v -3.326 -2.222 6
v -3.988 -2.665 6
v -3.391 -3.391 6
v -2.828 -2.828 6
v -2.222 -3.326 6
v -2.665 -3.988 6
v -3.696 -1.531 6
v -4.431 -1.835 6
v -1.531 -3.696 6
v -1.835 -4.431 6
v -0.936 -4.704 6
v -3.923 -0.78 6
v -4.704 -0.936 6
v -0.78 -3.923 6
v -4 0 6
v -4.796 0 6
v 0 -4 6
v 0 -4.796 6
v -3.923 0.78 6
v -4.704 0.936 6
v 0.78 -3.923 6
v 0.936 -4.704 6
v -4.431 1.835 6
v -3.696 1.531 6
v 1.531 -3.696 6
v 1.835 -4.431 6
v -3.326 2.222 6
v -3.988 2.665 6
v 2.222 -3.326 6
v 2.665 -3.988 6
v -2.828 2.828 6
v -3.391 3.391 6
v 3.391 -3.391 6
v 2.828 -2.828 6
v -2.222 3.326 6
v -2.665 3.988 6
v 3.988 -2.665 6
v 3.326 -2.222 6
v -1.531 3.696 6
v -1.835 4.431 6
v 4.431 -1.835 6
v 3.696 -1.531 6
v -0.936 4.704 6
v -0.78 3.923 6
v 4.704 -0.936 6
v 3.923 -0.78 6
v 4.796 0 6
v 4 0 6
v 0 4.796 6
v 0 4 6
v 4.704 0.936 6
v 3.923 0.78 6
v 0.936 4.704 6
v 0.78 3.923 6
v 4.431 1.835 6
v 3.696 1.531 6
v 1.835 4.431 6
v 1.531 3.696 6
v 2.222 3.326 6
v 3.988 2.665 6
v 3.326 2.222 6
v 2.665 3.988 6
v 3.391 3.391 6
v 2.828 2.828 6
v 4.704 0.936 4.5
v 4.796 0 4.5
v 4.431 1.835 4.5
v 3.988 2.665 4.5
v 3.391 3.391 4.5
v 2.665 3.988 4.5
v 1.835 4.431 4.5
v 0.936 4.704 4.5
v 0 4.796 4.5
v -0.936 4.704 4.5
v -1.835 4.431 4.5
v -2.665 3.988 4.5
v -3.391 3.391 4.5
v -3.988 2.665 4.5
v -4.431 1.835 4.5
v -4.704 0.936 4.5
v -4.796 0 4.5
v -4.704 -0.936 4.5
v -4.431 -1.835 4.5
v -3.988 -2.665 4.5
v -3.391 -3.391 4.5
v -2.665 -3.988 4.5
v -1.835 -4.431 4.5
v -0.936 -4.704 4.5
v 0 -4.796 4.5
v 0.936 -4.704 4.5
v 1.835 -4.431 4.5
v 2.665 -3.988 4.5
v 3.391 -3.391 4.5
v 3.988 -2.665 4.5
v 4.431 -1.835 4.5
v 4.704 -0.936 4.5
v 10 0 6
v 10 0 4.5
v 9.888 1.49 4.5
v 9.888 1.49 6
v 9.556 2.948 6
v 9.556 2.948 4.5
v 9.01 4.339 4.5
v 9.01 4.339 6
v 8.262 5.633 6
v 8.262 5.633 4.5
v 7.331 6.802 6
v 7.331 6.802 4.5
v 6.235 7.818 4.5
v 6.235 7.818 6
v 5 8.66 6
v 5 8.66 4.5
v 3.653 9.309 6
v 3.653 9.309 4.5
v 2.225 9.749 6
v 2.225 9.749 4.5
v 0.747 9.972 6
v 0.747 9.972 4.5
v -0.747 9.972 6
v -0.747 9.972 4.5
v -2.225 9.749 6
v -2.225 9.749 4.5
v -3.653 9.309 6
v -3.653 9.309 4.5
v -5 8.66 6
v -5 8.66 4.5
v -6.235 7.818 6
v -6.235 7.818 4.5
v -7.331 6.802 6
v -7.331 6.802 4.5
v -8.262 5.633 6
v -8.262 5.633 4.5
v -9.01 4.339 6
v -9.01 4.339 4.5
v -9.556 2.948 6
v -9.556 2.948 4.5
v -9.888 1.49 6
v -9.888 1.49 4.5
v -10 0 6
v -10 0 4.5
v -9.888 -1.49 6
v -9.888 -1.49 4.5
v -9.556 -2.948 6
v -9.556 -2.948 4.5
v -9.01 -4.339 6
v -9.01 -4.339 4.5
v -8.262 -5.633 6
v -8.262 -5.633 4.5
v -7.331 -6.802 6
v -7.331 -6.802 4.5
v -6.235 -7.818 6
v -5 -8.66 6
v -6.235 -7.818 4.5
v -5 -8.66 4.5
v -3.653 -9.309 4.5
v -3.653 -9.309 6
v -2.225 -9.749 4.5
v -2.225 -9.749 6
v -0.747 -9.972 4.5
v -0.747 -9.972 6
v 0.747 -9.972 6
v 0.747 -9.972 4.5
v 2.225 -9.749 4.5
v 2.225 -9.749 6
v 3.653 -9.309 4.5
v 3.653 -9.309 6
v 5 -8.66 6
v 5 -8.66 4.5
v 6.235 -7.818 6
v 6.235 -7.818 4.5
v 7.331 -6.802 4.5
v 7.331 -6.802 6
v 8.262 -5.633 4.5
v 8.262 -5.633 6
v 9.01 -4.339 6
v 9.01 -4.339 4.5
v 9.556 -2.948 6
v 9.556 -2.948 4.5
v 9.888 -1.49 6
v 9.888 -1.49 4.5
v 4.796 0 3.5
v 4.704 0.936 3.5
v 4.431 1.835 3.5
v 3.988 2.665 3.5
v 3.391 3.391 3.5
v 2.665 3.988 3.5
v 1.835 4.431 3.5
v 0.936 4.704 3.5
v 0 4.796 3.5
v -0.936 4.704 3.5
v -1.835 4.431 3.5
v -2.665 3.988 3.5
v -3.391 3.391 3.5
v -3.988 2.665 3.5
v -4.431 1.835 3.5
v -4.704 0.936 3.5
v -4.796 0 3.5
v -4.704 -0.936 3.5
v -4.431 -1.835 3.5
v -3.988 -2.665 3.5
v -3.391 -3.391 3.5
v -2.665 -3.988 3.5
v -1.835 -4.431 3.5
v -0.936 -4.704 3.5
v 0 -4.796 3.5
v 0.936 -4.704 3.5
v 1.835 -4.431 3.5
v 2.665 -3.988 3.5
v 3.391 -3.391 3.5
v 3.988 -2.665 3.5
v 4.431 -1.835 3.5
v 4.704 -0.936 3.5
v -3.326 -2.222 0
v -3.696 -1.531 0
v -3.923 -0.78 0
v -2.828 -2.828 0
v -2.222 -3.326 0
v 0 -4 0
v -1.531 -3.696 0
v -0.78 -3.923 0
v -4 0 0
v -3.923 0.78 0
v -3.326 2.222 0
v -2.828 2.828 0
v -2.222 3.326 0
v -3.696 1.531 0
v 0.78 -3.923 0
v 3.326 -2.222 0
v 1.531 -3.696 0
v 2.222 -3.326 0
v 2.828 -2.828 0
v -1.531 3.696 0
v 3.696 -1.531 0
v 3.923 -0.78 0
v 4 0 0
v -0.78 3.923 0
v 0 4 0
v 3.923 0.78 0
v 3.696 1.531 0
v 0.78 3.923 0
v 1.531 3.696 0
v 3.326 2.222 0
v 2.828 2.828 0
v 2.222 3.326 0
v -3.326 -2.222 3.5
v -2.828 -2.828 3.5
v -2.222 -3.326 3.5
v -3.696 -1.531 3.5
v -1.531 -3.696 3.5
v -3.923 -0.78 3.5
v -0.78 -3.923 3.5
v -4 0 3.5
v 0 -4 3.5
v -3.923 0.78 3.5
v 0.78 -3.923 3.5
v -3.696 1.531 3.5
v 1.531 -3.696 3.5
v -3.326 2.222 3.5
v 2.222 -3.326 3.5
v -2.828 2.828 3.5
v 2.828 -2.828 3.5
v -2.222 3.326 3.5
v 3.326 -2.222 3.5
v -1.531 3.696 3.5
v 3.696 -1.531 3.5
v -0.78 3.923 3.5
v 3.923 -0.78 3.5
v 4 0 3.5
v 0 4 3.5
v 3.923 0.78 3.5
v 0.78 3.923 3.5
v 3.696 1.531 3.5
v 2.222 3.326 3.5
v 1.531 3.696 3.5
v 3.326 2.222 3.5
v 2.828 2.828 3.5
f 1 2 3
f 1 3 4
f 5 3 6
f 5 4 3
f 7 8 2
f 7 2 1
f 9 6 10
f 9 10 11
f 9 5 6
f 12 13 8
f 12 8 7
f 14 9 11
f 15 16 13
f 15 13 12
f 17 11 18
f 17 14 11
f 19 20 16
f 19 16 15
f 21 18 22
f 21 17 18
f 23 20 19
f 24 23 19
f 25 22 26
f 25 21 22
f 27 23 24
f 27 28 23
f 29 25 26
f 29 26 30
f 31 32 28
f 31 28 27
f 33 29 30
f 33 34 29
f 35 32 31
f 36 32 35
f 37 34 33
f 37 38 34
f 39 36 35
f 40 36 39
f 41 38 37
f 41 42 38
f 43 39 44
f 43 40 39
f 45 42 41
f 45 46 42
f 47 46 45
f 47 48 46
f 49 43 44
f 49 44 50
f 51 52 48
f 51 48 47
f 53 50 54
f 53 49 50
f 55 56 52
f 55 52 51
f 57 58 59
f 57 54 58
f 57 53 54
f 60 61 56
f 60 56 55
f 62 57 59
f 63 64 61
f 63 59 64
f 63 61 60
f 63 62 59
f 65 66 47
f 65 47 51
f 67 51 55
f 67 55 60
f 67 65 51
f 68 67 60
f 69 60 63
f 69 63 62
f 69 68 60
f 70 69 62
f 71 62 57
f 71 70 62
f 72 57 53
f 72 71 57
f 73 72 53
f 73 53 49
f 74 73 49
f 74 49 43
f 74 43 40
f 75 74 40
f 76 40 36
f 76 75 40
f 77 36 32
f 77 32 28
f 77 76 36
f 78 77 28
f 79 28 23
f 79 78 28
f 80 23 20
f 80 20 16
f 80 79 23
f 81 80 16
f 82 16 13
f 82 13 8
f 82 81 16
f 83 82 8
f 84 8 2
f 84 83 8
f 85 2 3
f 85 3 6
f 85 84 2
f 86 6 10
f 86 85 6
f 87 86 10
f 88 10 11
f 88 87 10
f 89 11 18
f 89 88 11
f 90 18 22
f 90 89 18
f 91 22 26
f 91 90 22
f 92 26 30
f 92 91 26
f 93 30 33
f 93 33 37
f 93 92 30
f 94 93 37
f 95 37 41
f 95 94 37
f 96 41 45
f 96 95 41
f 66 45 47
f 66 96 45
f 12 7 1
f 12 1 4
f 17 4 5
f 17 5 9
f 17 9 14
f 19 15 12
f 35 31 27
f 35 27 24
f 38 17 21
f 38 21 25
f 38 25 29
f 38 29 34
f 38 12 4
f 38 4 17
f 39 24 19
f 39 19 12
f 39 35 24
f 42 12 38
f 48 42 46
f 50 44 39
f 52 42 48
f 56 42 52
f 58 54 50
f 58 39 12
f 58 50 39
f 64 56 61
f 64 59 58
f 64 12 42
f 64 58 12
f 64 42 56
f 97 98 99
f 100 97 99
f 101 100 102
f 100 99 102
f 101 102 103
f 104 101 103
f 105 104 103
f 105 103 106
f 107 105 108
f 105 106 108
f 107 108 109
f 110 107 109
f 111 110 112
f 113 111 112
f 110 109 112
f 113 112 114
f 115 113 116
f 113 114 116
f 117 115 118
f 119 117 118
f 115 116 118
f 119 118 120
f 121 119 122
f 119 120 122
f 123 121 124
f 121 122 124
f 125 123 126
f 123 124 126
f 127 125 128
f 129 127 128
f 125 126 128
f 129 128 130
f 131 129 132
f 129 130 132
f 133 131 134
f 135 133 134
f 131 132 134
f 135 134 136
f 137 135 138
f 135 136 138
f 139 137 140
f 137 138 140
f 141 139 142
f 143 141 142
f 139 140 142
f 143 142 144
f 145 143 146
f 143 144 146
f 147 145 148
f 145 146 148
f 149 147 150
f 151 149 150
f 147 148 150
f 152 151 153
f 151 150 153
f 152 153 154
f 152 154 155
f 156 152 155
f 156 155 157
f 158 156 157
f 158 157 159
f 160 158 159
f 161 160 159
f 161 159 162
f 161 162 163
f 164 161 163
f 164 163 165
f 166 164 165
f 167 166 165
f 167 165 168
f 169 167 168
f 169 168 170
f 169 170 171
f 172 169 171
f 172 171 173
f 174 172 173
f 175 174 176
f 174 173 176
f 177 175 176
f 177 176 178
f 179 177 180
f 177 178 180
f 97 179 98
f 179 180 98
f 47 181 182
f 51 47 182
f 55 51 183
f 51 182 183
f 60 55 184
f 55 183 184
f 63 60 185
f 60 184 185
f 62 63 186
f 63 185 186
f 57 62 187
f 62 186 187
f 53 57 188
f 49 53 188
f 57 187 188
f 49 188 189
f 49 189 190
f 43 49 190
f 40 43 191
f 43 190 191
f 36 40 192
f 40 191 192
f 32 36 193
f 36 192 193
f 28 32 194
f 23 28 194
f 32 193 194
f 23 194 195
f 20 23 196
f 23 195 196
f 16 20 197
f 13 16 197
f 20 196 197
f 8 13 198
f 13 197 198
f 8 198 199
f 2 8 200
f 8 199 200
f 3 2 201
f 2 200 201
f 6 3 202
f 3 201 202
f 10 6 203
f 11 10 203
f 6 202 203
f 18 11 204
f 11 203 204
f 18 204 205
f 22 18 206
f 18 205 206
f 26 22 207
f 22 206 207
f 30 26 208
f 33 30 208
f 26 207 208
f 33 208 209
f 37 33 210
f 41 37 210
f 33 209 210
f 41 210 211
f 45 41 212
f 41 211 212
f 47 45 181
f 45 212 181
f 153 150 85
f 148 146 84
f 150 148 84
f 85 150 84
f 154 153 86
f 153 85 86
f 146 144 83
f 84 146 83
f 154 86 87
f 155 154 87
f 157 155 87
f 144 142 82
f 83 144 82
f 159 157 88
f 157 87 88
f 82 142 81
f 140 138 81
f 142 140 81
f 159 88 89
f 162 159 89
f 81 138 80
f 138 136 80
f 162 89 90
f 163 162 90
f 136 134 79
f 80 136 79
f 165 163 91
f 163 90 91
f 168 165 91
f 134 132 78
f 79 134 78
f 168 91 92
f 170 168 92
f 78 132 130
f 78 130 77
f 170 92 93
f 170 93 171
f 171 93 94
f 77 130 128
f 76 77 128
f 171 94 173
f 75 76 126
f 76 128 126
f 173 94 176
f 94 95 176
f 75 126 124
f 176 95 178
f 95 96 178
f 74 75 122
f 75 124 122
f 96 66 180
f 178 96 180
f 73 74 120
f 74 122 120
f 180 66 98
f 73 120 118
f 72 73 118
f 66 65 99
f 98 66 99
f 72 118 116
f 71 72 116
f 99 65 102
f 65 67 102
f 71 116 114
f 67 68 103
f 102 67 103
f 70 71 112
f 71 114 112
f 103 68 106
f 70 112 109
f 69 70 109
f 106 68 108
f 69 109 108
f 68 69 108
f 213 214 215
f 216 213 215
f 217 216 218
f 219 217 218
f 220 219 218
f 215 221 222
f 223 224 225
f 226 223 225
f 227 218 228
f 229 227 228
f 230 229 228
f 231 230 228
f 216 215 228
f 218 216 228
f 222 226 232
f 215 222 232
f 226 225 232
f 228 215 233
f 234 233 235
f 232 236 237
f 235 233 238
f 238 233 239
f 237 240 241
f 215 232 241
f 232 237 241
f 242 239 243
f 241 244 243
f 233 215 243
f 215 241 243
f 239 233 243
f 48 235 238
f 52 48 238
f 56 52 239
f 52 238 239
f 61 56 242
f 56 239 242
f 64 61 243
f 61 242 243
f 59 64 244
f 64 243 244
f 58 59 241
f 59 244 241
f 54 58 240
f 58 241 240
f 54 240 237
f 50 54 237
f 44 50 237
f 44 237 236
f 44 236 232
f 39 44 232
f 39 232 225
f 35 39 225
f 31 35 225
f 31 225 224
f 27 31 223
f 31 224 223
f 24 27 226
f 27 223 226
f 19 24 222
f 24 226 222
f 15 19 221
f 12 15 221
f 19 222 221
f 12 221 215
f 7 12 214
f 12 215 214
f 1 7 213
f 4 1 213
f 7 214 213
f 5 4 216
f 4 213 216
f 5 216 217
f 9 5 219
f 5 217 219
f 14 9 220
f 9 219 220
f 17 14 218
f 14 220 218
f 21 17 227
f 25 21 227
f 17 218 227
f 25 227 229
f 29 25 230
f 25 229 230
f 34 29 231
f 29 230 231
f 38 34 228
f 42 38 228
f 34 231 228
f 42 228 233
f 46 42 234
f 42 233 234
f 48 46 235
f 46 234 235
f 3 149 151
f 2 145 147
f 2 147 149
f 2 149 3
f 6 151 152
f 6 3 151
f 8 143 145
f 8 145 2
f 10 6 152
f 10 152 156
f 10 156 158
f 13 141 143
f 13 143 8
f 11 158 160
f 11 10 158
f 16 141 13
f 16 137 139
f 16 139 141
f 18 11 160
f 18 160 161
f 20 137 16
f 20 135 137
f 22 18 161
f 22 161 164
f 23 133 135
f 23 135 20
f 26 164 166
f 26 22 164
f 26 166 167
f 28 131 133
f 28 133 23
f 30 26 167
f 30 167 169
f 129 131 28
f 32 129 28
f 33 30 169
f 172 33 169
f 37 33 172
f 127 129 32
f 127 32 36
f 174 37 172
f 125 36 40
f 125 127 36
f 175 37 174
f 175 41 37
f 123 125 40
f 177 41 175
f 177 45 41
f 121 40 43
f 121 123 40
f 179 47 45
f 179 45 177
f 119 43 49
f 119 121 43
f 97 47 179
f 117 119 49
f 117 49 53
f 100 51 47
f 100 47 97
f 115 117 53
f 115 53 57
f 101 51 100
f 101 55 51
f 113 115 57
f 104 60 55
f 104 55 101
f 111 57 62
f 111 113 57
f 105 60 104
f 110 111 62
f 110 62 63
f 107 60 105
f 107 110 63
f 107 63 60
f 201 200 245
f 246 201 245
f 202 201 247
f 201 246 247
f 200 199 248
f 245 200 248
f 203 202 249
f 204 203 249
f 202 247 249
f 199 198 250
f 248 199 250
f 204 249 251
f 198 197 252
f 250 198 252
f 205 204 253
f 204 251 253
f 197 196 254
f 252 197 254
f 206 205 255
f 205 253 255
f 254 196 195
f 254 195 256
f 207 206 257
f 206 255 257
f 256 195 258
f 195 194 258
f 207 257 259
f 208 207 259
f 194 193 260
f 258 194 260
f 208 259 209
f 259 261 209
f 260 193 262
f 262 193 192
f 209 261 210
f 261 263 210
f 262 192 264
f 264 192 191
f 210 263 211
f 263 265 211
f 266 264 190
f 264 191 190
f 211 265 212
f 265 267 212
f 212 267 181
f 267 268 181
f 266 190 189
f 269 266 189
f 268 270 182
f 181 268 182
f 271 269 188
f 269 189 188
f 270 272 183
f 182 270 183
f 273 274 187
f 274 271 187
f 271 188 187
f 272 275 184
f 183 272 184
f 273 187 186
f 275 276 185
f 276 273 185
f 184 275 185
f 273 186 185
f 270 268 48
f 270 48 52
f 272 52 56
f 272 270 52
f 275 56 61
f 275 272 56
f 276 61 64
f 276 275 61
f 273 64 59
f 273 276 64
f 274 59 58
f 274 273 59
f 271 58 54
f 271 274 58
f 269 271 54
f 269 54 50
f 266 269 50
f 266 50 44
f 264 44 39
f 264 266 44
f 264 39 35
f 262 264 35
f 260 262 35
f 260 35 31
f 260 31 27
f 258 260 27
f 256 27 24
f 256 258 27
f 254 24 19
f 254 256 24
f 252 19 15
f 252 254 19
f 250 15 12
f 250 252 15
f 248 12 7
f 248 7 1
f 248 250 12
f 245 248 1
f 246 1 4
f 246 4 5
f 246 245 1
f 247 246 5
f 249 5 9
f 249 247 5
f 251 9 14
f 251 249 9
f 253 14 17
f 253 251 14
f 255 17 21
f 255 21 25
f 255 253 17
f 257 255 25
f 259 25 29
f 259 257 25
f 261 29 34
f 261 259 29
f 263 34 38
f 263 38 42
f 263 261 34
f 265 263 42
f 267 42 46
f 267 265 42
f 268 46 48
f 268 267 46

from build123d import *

# Parameters (mm, degrees)
F0_R     = 4
F1_DEPTH = 6
F0_R_2   = 10
F0_R_3   = 4.796084
F2_DEPTH = 1.5
F4_DEPTH = 2.5


with BuildPart() as f1:
    # F0 (on Top) → F1 (new body)
    with BuildSketch(Plane.XY):
        Circle(F0_R)
    extrude(amount=F1_DEPTH)


with BuildPart() as f2:
    # F0 (on Top) → F2 (new body)
    with BuildSketch(Plane.XY):
        Circle(F0_R_2)
        Circle(F0_R_3, mode=Mode.SUBTRACT)
    extrude(amount=F2_DEPTH)


with BuildPart() as f2_1:
    # F3: moved
    add(f2.part.moved(Location((0, 0, 4.5))))


with BuildPart() as f4:
    # F0 (on Top) → F4 (new body)
    with BuildSketch(Plane.XY):
        Circle(F0_R_3)
        Circle(F0_R, mode=Mode.SUBTRACT)
    extrude(amount=F4_DEPTH)


with BuildPart() as f4_1:
    # F5: moved
    add(f4.part.moved(Location((0, 0, 3.5))))


solid = Compound([f1.part, f2_1.part, f4_1.part])
